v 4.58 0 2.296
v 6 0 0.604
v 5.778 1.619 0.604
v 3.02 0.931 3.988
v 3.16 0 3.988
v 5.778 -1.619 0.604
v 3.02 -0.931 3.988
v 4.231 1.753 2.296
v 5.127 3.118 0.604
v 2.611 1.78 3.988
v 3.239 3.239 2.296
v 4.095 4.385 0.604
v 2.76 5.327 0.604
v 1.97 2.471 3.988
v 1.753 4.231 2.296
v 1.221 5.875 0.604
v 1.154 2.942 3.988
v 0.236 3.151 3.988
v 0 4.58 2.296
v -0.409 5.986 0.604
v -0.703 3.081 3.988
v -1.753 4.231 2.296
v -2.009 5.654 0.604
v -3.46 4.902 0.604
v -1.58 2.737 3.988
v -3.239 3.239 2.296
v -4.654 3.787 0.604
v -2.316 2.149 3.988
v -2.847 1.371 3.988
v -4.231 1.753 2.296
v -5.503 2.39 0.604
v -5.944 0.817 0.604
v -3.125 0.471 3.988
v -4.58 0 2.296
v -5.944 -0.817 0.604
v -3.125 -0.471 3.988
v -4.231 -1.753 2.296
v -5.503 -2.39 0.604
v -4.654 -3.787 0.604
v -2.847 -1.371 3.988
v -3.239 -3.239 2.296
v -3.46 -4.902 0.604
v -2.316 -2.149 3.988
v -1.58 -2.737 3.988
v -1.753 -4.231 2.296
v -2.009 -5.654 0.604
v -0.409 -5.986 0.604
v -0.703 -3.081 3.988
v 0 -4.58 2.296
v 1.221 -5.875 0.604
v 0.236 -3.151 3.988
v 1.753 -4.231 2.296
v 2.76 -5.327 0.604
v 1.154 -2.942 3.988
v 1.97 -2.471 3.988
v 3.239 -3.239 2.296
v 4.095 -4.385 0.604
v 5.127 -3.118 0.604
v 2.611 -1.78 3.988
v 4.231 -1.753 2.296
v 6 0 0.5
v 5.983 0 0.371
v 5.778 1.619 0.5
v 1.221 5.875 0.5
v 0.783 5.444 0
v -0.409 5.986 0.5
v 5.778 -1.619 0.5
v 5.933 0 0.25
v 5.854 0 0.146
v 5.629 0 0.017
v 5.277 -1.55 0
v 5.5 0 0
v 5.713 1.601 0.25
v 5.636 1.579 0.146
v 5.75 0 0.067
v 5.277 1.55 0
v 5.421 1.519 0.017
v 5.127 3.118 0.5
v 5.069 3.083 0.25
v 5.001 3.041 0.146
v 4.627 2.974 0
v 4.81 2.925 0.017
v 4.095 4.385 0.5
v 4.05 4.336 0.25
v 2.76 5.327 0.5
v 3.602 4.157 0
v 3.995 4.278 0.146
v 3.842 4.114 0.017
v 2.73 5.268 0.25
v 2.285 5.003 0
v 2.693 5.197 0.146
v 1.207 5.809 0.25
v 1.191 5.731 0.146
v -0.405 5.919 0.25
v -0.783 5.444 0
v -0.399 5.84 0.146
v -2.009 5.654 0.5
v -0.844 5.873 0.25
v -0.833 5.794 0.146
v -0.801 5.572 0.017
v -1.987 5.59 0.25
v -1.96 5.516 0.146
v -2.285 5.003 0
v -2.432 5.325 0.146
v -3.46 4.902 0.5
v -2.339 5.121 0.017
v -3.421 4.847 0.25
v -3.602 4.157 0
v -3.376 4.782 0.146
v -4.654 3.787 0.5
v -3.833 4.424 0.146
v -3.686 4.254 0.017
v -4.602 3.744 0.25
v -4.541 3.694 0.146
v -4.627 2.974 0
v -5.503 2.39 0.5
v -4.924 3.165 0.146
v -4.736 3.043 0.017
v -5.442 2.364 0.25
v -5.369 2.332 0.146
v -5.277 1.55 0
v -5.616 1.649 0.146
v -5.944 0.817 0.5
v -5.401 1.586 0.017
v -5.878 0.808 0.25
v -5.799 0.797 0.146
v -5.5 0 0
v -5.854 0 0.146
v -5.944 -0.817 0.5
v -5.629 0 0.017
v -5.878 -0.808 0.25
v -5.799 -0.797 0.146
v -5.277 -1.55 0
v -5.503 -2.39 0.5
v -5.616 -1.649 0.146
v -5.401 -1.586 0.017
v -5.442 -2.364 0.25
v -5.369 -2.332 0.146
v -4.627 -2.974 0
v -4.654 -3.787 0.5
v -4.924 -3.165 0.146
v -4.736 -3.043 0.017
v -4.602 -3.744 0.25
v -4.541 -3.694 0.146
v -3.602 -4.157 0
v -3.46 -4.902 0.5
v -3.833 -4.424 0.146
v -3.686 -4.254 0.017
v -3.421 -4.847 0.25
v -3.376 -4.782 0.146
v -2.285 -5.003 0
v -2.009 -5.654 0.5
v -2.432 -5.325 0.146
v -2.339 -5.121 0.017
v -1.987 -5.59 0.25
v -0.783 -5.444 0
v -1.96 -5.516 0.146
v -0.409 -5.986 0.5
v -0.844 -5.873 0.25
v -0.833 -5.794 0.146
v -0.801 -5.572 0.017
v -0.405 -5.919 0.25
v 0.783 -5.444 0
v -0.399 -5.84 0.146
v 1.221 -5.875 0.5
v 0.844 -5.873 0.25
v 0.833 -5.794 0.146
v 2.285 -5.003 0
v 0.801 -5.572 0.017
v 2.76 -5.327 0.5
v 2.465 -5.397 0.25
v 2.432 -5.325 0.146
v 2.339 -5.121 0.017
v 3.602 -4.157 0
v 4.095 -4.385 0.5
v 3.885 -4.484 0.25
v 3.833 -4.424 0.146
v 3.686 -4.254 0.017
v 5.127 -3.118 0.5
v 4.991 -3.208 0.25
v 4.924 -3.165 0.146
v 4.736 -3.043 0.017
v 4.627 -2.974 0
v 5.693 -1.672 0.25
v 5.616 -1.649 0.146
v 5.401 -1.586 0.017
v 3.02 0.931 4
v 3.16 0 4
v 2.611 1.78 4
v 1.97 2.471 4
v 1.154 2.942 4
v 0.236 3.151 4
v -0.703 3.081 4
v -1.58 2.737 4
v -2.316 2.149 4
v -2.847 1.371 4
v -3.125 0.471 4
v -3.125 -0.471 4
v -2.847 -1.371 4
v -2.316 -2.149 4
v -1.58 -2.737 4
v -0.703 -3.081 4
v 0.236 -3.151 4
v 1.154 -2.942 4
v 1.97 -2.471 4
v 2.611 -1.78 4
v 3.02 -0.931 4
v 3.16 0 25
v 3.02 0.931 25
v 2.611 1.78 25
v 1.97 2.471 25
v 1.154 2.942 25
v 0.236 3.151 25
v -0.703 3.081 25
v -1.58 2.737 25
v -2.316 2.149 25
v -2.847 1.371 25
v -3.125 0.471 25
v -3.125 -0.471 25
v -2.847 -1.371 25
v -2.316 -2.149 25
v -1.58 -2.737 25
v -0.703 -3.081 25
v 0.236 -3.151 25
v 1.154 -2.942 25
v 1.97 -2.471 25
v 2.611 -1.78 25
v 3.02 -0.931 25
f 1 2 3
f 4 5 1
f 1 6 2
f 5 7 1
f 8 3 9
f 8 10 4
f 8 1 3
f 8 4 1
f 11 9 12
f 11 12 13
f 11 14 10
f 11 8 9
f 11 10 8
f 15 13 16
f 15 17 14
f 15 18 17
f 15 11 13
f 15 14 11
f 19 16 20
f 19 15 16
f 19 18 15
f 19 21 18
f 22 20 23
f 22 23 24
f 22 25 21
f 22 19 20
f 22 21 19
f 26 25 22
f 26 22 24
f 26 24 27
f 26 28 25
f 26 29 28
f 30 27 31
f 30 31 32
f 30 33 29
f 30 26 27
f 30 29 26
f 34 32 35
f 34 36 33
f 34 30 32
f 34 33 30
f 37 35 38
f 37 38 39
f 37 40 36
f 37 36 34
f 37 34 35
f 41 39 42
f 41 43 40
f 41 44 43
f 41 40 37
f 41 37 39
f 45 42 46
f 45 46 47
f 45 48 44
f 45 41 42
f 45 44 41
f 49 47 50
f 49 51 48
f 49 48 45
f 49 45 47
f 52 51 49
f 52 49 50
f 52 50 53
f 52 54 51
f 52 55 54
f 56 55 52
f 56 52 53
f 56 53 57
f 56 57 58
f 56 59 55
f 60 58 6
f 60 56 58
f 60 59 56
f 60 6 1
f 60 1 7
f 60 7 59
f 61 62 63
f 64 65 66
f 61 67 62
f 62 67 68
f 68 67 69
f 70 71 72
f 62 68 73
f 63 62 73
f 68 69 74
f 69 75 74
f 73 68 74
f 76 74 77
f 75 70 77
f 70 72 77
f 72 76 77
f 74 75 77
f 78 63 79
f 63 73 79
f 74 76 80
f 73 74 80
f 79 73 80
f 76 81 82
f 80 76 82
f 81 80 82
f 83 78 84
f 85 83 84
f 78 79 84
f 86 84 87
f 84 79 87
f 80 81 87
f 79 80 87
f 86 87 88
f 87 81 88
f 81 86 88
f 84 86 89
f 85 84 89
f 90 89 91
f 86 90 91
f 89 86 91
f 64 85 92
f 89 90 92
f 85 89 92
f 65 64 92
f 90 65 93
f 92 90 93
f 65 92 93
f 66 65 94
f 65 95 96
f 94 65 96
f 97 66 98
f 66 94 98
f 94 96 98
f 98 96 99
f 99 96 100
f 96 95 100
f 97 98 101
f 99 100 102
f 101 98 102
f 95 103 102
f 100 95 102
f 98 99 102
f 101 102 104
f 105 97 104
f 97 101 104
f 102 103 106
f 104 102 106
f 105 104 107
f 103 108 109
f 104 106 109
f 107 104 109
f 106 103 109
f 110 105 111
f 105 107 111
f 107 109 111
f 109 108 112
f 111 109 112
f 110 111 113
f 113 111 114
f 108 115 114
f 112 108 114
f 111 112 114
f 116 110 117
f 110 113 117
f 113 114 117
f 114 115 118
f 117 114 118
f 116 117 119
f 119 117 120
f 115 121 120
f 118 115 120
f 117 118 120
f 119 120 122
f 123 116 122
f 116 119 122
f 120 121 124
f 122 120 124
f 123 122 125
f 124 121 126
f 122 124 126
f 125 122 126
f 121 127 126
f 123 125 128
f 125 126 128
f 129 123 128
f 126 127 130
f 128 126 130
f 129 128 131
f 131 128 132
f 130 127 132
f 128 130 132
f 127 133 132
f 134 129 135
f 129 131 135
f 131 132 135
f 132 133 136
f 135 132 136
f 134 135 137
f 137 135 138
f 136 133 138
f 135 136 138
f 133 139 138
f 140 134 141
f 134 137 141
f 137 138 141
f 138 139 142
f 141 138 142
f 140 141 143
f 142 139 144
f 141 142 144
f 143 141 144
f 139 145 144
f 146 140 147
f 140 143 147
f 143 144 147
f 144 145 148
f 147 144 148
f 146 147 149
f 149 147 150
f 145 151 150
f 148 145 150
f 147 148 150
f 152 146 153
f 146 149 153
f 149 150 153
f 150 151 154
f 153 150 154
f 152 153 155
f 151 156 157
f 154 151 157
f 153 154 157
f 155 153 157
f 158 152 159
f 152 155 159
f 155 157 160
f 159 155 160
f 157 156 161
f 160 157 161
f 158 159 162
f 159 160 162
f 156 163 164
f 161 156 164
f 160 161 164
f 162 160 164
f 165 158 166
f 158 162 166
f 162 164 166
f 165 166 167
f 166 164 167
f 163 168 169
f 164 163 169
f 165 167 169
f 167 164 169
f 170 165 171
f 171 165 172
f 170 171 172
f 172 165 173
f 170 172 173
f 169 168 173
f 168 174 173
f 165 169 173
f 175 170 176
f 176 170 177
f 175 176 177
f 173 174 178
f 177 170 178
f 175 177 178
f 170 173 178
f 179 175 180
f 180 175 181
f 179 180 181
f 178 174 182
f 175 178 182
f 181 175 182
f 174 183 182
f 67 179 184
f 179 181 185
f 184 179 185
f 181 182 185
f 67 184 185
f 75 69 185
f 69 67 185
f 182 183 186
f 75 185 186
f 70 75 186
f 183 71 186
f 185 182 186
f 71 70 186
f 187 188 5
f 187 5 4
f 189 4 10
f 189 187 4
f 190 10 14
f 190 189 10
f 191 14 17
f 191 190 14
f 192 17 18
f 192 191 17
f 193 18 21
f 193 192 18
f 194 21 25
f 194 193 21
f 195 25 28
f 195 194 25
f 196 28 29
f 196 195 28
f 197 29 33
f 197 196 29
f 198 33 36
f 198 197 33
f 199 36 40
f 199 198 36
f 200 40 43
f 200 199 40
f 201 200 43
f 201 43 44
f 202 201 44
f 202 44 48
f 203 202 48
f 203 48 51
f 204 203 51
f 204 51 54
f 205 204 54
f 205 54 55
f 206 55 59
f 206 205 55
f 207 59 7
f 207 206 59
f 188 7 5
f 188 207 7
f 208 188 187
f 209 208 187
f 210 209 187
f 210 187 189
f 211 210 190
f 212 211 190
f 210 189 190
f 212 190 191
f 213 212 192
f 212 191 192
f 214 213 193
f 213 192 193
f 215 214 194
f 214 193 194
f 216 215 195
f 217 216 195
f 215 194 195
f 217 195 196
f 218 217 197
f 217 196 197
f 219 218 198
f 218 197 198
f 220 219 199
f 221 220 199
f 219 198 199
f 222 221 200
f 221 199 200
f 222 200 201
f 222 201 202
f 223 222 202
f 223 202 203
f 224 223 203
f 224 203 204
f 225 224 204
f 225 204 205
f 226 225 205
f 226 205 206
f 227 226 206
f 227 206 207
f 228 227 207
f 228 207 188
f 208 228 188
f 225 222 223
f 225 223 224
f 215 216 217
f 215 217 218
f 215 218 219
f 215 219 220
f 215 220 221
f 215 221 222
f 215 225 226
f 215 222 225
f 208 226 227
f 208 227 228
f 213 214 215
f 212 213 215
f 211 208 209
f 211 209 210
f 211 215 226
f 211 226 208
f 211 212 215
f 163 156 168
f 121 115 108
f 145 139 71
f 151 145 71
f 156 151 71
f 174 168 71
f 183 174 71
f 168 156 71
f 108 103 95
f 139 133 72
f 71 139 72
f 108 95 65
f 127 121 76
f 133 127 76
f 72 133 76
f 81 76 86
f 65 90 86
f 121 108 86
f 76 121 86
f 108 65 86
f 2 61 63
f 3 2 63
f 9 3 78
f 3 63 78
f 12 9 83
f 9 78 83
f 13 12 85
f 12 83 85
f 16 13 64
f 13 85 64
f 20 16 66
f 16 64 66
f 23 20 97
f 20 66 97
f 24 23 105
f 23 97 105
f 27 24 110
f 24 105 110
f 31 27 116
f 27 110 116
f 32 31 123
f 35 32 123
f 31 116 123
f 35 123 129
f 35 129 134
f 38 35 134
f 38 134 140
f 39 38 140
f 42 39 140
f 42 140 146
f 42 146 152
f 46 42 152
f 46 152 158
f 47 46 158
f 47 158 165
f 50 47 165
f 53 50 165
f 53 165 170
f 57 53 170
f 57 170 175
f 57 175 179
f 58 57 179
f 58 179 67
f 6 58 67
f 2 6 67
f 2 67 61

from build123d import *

# Parameters (mm, degrees)
F0_R        = 6
F0_R_2      = 3.16
F1_DEPTH    = 4
F2_DEPTH    = 25
F3_S5_R     = 3.16
F3_T6_DEPTH = 10
F4_R        = 0.5


# Not quite as in the source:
# - a fillet or chamfer that OpenCascade refuses, or shapes differently, is made with other operations: its cross-section is extruded or revolved along the edge and cut away or added


with BuildPart() as f1:
    # F0 (on Top) → F1 (new body)
    with BuildSketch(Plane.XY):
        Circle(F0_R)
        Circle(F0_R_2, mode=Mode.SUBTRACT)
    extrude(amount=F1_DEPTH)

    # F0 (on Top) → F2 (join)
    with BuildSketch(Plane.XY):
        Circle(F0_R_2)
    extrude(amount=F2_DEPTH)

    # F3: chamfer of 2.85 x 3.3964977389 on 1 edges, made by hand


with BuildPart() as f3_tool2:
    # F3_s3 → F3_t4 (revolve)
    with BuildSketch(Plane.XZ):
        Polygon((6, 0.6035022611), (3.15, 4), (6, 4), align=None)
    revolve(axis=Axis((0, 0, 4), (0, 0, 1)))

    # F3_s5 → F3_t6 (cut, symmetric)
    with BuildSketch(Plane.XY.offset(2.3)):
        Circle(F3_S5_R)
    extrude(amount=F3_T6_DEPTH, both=True, mode=Mode.SUBTRACT)


with BuildPart() as f1_1:
    add(f1.part)

    # F3_t1: cut F3_tool2
    add(f3_tool2.part, mode=Mode.SUBTRACT)

    # F4
    f4_edges = [f1_1.edges().sort_by_distance(p)[0] for p in [
        (-6, 0, 0),
    ]]
    fillet(f4_edges, radius=F4_R)


solid = f1_1.part
